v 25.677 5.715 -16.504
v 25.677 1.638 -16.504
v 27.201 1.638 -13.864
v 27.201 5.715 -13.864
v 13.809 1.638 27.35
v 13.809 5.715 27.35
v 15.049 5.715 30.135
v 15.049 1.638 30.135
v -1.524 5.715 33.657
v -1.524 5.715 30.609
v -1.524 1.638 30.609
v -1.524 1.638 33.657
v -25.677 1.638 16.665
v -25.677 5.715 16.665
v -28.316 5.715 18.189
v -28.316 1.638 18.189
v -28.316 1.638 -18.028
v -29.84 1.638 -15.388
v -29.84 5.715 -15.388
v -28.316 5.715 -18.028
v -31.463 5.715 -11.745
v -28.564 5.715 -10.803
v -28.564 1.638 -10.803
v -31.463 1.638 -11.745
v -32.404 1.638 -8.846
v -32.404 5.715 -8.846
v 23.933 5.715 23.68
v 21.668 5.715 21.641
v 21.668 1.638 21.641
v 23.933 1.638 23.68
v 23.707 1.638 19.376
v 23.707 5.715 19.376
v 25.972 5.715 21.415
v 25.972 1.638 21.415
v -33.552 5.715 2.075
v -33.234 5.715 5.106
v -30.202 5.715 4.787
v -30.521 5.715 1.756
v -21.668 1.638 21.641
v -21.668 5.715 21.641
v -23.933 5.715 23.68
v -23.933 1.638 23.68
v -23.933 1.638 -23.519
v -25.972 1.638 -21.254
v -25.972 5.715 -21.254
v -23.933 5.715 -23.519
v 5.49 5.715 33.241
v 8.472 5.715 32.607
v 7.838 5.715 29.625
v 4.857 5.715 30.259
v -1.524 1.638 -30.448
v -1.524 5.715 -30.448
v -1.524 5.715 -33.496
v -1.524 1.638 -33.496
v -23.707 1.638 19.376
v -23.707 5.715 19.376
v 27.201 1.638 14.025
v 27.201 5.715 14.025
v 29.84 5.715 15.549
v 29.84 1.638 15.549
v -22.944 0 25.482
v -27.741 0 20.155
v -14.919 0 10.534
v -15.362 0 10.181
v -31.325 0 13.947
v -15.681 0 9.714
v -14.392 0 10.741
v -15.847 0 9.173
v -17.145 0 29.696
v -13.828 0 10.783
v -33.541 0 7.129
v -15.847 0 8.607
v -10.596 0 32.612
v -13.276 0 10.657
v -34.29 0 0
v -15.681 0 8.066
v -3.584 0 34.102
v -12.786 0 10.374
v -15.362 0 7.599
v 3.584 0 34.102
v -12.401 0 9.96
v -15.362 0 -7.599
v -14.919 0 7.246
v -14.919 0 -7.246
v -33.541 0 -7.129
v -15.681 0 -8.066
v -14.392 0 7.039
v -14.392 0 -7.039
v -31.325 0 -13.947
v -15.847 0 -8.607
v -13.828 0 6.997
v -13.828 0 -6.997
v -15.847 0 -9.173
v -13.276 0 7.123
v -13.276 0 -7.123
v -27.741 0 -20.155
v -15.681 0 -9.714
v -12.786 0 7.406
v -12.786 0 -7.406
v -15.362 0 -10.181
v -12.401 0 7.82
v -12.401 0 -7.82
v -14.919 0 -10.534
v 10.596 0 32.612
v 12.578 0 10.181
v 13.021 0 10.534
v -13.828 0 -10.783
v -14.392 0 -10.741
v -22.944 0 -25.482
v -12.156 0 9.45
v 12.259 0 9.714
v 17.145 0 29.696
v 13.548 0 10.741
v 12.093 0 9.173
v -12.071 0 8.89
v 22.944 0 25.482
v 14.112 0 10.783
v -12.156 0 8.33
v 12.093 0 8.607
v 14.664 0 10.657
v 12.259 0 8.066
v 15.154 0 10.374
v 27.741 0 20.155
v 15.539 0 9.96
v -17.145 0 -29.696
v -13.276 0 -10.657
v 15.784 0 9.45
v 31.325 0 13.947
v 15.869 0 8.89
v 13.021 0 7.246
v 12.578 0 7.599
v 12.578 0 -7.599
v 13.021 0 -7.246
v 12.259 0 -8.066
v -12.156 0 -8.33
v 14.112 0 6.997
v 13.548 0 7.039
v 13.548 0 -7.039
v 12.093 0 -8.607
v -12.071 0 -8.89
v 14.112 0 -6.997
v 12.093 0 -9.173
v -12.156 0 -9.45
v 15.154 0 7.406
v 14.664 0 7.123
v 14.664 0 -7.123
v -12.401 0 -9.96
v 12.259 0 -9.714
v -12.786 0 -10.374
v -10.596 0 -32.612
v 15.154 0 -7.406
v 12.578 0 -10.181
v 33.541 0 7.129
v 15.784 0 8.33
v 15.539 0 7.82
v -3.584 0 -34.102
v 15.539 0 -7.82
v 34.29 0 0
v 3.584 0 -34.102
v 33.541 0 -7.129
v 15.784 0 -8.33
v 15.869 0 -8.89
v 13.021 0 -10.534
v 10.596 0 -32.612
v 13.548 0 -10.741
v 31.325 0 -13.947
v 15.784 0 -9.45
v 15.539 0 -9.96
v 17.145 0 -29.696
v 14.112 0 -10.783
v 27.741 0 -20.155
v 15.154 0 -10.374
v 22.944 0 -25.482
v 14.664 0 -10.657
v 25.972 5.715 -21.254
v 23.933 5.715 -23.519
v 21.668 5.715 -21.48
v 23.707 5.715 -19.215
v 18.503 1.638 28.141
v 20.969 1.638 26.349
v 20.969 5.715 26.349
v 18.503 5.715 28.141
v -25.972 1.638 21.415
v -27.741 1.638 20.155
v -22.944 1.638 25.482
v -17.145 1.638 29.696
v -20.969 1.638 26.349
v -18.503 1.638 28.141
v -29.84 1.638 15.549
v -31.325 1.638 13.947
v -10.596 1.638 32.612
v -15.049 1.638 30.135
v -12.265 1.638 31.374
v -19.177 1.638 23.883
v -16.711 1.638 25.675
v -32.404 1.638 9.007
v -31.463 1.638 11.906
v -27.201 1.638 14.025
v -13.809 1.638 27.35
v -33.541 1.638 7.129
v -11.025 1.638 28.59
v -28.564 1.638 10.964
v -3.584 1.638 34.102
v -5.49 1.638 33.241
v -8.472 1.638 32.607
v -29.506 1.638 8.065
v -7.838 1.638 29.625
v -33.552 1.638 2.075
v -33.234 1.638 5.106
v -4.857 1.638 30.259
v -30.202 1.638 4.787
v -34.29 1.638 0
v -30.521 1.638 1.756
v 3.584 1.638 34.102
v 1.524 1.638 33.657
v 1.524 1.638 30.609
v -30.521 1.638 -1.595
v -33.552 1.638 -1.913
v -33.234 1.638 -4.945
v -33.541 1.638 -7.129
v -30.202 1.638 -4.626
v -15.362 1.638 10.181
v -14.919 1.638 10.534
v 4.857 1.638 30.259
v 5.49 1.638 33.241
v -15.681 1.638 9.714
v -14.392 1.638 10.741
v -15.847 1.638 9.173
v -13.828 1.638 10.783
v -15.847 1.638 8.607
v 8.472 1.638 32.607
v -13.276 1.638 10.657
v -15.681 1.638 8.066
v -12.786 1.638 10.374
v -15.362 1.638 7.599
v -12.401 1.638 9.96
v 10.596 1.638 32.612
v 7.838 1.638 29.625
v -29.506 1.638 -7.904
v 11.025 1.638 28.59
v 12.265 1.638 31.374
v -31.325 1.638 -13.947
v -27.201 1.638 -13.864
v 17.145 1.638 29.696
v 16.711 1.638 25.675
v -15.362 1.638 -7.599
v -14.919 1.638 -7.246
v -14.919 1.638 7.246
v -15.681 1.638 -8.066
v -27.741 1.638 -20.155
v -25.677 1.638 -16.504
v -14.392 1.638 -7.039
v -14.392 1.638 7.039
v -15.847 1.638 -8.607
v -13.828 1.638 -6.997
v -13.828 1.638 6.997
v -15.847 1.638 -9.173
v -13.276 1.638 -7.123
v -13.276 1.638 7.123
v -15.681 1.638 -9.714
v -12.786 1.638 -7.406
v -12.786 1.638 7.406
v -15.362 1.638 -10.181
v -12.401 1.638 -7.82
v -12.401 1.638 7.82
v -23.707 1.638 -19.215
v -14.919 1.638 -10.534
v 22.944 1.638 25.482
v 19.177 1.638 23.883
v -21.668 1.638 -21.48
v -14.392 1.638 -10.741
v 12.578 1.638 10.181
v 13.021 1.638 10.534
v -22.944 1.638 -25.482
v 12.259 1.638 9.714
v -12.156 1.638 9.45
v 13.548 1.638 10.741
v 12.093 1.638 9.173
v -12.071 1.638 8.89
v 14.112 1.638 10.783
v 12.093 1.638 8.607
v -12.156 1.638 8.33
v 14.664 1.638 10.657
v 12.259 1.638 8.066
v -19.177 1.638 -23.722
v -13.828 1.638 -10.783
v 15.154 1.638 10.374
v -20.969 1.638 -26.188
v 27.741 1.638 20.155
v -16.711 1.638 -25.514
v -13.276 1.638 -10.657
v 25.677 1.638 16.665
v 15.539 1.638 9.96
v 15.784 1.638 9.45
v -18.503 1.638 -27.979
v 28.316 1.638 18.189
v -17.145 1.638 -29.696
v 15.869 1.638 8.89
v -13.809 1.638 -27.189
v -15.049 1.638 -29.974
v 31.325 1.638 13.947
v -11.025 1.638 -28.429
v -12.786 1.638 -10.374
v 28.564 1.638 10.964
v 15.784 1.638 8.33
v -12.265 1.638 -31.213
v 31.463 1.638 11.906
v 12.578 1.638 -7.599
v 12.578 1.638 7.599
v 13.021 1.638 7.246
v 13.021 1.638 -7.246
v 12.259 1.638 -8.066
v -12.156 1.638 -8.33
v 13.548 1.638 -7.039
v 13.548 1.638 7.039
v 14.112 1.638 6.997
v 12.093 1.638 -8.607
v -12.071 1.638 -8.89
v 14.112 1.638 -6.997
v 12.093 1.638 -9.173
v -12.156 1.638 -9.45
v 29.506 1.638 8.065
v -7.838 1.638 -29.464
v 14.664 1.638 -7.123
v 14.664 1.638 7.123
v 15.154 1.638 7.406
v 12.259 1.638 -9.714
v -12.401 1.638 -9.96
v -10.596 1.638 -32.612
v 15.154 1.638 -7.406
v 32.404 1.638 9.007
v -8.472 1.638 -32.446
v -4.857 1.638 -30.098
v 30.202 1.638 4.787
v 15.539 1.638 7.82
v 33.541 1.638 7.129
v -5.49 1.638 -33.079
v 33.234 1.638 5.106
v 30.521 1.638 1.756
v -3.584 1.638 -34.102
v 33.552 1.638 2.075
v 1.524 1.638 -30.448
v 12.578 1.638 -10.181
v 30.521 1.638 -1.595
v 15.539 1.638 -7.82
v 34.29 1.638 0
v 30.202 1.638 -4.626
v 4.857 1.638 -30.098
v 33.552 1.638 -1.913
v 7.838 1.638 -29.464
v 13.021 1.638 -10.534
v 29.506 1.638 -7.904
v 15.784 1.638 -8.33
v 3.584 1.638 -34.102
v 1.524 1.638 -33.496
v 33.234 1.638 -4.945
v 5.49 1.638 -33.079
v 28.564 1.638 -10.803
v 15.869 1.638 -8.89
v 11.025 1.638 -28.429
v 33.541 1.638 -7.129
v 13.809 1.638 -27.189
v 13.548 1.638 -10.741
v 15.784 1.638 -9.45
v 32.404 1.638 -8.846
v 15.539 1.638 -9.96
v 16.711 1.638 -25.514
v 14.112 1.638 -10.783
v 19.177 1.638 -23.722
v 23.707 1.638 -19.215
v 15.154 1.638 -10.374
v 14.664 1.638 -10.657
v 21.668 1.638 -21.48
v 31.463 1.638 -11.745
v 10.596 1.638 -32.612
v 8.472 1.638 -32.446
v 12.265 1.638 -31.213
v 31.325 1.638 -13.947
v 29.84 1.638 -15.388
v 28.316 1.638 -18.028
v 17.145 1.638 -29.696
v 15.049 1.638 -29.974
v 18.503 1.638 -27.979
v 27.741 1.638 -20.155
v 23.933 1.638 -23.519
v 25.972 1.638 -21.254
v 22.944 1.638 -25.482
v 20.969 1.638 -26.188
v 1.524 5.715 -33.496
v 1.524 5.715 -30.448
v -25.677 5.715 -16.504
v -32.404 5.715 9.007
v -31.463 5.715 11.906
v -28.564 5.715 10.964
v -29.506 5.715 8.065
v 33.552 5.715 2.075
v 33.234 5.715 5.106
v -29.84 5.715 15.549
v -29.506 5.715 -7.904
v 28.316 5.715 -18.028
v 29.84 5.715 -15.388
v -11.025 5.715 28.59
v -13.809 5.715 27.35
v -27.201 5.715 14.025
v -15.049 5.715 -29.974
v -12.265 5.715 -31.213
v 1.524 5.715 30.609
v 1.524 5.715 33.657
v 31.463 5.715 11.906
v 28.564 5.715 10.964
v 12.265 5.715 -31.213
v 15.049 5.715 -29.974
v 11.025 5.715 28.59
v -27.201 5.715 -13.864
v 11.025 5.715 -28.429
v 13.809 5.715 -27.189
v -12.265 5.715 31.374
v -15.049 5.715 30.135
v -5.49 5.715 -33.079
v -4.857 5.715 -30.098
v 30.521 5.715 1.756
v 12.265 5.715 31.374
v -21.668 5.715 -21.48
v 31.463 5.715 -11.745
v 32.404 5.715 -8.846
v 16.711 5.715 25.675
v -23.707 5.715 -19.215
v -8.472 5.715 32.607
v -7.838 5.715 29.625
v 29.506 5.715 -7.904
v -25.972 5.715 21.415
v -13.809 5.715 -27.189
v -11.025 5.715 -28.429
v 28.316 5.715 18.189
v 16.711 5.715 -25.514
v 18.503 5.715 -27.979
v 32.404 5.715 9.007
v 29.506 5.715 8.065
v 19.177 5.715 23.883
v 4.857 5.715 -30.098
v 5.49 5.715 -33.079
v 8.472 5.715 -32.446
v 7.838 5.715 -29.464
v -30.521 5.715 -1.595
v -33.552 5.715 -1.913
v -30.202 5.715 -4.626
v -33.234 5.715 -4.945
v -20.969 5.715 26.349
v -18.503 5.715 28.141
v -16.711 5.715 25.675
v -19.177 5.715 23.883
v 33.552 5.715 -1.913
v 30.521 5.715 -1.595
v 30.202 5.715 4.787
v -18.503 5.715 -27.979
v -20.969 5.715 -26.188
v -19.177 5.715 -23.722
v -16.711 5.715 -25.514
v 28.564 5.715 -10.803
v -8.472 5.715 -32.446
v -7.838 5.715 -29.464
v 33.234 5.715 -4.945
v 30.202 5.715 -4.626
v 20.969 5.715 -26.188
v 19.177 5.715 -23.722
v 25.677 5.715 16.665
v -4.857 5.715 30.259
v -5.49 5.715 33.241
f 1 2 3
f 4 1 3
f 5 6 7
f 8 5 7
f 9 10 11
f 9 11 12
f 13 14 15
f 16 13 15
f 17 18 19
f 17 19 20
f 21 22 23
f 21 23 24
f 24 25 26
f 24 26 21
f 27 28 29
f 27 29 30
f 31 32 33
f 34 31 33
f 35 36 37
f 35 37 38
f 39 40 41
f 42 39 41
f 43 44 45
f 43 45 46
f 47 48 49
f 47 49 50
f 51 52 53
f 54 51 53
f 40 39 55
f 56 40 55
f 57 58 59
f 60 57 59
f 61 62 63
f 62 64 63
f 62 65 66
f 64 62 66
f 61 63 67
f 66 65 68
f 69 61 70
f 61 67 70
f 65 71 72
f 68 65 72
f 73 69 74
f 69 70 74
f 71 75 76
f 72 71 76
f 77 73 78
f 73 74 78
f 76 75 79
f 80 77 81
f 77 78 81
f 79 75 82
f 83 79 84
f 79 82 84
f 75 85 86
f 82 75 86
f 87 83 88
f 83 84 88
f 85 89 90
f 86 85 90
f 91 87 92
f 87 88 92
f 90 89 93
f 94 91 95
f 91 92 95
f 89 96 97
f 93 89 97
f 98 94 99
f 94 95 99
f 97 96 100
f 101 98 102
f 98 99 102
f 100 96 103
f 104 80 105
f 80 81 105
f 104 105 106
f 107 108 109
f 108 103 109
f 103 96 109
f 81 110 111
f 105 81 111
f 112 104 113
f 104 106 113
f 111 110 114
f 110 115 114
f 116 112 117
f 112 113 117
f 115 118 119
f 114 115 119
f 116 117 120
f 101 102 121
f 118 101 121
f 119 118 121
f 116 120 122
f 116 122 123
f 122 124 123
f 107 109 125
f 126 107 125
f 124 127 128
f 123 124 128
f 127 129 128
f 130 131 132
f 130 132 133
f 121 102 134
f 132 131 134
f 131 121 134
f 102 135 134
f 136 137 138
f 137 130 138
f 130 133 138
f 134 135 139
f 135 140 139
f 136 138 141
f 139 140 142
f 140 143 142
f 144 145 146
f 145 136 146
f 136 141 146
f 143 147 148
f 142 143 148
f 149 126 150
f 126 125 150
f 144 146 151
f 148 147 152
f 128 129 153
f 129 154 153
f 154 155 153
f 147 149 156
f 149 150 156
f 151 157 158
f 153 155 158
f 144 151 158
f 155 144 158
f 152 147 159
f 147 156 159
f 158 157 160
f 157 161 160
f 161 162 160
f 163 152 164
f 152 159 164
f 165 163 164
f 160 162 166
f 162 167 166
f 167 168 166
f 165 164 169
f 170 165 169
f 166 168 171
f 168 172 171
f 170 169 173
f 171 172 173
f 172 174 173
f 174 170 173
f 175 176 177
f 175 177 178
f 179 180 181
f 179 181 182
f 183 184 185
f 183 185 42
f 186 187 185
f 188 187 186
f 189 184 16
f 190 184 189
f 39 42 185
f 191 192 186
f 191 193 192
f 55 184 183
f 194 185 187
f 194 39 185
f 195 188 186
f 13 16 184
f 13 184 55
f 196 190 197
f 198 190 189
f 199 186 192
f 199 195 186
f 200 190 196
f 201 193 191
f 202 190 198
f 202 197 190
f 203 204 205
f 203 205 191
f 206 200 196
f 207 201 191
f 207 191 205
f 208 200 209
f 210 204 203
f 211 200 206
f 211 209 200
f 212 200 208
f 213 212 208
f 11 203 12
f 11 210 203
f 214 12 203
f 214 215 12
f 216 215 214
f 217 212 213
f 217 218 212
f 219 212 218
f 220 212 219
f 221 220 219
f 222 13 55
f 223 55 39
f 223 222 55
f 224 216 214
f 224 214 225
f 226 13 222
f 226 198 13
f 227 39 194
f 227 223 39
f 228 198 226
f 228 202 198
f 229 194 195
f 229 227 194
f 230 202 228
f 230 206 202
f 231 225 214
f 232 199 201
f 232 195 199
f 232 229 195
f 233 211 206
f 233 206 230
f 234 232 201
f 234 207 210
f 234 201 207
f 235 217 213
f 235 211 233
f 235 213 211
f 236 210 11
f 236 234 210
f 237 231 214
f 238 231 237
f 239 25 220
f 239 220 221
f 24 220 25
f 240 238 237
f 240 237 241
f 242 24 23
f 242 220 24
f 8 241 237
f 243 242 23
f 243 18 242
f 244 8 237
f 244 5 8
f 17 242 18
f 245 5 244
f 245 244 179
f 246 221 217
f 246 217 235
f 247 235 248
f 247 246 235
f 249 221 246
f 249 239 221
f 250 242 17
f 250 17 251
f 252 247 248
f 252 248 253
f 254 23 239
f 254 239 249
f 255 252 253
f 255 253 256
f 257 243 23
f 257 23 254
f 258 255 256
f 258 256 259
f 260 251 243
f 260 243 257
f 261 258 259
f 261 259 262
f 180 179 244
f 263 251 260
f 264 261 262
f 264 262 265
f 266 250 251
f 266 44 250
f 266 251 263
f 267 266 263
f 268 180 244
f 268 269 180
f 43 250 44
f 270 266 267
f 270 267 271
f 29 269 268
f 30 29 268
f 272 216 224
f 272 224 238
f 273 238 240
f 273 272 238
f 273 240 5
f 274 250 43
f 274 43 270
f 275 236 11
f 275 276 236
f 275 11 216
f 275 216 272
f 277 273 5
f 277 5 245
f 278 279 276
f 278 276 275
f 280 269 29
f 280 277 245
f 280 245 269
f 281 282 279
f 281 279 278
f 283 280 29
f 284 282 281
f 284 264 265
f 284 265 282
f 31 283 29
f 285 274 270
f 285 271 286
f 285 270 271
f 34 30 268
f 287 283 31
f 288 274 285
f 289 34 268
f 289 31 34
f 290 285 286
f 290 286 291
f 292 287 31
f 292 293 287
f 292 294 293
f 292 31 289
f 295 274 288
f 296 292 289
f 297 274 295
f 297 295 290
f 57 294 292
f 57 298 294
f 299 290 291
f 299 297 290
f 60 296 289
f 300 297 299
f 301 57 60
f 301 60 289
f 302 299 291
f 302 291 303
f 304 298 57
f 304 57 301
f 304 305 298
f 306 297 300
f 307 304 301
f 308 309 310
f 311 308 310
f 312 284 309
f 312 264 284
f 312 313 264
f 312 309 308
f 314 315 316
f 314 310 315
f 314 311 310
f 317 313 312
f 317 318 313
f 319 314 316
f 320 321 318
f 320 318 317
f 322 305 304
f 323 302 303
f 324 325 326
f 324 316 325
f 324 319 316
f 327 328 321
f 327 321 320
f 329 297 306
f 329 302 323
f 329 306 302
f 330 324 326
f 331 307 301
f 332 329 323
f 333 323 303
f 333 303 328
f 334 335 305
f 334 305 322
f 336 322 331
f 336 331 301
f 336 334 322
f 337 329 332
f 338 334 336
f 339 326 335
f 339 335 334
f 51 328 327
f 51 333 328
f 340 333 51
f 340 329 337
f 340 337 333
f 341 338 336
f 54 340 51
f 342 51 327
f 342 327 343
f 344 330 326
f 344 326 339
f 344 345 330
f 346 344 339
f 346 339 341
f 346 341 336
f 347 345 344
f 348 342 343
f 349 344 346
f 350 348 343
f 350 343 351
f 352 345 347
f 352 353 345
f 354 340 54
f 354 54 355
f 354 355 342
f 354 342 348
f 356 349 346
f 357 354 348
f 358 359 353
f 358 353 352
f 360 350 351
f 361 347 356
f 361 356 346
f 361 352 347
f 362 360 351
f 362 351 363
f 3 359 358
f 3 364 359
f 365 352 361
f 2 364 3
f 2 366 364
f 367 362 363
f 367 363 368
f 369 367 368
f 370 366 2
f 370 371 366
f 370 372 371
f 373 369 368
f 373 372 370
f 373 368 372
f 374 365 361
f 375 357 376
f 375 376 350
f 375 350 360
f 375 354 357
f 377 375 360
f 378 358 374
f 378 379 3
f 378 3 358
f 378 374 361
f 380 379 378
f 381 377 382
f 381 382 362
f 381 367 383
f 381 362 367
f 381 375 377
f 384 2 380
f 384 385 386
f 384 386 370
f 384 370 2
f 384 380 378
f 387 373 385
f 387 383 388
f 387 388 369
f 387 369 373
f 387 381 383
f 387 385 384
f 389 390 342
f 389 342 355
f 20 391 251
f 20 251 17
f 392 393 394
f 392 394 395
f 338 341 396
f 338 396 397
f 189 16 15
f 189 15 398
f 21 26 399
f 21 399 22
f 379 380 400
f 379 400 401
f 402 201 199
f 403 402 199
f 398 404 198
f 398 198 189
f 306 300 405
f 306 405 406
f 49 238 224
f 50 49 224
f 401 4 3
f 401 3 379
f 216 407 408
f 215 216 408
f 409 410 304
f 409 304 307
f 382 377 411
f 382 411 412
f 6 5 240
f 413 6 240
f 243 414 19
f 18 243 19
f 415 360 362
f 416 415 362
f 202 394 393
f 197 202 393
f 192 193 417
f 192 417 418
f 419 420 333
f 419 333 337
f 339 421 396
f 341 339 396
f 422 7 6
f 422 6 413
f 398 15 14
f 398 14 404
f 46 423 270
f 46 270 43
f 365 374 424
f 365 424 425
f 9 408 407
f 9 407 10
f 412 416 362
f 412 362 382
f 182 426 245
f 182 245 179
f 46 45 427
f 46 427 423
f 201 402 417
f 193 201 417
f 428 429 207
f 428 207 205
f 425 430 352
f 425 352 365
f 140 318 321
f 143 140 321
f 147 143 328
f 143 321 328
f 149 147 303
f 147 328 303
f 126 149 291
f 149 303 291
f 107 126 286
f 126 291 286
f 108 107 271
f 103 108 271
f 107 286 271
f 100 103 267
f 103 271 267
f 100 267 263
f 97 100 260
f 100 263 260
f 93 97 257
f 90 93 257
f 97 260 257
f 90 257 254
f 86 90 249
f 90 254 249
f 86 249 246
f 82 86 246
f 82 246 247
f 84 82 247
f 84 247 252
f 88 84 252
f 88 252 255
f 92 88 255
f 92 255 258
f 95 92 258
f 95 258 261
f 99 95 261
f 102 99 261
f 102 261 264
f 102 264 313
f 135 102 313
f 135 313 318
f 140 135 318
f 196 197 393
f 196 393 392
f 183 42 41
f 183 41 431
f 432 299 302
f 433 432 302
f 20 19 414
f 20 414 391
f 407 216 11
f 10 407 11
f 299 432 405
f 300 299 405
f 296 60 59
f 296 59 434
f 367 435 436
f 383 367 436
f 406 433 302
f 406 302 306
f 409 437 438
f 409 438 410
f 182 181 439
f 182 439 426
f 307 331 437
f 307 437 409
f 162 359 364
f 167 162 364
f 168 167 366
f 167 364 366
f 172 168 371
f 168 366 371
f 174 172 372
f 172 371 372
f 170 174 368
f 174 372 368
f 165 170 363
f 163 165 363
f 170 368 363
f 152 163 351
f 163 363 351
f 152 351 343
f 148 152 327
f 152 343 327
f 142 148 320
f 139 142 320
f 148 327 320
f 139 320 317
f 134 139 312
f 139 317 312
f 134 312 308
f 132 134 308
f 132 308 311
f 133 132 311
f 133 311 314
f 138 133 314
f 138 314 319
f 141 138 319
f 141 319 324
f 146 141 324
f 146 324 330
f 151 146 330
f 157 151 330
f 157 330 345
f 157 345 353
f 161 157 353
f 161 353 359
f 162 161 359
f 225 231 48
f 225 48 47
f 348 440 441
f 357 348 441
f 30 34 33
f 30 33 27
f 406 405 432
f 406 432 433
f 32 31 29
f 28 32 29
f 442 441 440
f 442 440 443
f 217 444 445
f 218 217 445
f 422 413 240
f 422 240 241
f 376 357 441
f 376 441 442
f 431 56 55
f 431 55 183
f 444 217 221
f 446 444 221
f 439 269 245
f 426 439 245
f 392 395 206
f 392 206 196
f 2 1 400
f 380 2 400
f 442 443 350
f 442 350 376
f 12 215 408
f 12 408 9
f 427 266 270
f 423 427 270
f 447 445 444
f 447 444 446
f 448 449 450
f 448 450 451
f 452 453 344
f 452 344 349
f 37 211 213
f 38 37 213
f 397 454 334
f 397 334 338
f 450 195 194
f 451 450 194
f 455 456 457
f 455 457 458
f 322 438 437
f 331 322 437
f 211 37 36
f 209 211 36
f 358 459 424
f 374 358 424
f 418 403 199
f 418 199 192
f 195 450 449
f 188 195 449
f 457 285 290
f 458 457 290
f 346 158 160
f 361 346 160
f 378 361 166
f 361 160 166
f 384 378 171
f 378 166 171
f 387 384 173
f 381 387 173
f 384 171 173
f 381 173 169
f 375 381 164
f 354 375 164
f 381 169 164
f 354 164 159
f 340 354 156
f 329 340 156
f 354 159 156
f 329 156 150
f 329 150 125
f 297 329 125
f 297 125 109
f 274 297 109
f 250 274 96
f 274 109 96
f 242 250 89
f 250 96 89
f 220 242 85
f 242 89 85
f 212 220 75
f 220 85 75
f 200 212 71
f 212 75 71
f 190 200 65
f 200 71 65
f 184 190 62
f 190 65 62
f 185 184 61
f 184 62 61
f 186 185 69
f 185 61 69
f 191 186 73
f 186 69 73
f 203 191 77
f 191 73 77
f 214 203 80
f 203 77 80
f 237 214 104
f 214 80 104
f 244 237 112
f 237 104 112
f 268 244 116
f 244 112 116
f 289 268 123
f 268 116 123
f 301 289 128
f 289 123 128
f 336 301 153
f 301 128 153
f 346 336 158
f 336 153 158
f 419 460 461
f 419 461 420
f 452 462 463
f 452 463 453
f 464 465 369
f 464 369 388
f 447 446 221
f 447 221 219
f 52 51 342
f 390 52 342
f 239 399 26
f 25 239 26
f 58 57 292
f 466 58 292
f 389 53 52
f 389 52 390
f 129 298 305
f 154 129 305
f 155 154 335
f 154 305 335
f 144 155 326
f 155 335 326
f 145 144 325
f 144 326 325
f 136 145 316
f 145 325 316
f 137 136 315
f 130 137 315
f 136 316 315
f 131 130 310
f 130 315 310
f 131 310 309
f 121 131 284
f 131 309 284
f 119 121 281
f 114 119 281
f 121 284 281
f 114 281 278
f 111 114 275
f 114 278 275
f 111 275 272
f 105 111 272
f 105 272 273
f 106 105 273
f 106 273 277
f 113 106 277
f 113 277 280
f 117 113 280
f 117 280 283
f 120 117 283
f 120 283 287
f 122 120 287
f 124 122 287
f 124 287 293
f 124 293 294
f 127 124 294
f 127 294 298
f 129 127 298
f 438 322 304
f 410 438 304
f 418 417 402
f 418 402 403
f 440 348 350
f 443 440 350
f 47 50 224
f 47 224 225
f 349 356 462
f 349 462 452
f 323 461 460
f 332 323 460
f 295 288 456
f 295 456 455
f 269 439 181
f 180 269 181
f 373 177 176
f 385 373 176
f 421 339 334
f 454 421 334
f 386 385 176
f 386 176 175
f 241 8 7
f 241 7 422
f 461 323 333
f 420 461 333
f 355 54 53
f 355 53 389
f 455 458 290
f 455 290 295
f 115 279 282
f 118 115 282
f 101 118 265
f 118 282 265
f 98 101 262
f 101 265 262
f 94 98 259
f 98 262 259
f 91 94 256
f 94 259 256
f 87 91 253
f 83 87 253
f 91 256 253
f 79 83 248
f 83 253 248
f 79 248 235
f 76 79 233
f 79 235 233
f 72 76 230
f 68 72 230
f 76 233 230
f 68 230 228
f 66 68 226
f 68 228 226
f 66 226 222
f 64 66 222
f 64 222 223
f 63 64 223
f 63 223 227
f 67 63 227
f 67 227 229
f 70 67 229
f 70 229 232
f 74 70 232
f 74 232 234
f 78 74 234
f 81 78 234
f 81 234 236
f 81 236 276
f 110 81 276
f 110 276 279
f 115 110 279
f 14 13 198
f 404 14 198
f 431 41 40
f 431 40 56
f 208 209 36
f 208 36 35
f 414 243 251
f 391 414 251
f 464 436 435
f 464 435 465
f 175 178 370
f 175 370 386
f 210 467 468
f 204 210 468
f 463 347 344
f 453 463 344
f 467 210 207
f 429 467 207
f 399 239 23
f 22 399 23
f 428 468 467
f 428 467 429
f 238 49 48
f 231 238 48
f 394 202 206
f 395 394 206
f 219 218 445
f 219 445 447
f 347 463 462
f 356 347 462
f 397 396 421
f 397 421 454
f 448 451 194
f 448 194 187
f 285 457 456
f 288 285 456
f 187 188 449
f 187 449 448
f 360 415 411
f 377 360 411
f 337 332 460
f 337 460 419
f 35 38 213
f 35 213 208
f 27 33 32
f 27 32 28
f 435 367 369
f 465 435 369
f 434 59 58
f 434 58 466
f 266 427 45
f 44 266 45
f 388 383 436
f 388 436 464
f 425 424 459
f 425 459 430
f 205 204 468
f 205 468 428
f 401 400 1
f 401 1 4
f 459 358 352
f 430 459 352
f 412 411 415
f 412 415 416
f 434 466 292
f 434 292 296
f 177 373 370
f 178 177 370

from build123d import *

# Parameters (mm, degrees)
SKETCH1_R                 = 34.29
BOSS_EXTRUDE1_DEPTH       = 1.6383
SKETCH3_W                 = 3.048
SKETCH3_H                 = 3.048
BOSS_EXTRUDE3_DEPTH       = 4.0767
CIRPATTERN1_COUNT         = 30
F_6_CLEARANCE_HOLE1_D     = 3.7973
F_6_CLEARANCE_HOLE1_DEPTH = 1.6383


with BuildPart() as part:
    # Sketch1 → Boss-Extrude1 (new body)
    with BuildSketch(Plane(origin=(0, 0, 0), x_dir=(1, 0, 0), z_dir=(0, 1, 0))):
        Circle(SKETCH1_R)
    extrude(amount=BOSS_EXTRUDE1_DEPTH)

    # Sketch3 → Boss-Extrude3 (add)
    with BuildSketch(Plane(origin=(0, 1.6383, 0), x_dir=(1, 0, 0), z_dir=(0, 1, 0))):
        with Locations((0, 31.97225)):
            Rectangle(SKETCH3_W, SKETCH3_H)
    boss_extrude3 = extrude(amount=BOSS_EXTRUDE3_DEPTH)

    # CirPattern1: Boss-Extrude3 ×30 about axis
    cirpattern1_axis = Axis((0, 0, 0.08061427), (0, 1, 0))
    for i in range(1, CIRPATTERN1_COUNT):
        add(boss_extrude3.rotate(cirpattern1_axis, i * 360 / CIRPATTERN1_COUNT))

    # #6 Clearance Hole1
    with Locations(Plane(origin=(0, 0, 0), x_dir=(-1, 0, 0), z_dir=(0, -1, 0))):
        with Locations((13.97, -8.89), (13.97, 8.89), (-13.97, 8.89), (-13.97, -8.89)):
            Hole(F_6_CLEARANCE_HOLE1_D / 2, depth=F_6_CLEARANCE_HOLE1_DEPTH)


solid = part.part
